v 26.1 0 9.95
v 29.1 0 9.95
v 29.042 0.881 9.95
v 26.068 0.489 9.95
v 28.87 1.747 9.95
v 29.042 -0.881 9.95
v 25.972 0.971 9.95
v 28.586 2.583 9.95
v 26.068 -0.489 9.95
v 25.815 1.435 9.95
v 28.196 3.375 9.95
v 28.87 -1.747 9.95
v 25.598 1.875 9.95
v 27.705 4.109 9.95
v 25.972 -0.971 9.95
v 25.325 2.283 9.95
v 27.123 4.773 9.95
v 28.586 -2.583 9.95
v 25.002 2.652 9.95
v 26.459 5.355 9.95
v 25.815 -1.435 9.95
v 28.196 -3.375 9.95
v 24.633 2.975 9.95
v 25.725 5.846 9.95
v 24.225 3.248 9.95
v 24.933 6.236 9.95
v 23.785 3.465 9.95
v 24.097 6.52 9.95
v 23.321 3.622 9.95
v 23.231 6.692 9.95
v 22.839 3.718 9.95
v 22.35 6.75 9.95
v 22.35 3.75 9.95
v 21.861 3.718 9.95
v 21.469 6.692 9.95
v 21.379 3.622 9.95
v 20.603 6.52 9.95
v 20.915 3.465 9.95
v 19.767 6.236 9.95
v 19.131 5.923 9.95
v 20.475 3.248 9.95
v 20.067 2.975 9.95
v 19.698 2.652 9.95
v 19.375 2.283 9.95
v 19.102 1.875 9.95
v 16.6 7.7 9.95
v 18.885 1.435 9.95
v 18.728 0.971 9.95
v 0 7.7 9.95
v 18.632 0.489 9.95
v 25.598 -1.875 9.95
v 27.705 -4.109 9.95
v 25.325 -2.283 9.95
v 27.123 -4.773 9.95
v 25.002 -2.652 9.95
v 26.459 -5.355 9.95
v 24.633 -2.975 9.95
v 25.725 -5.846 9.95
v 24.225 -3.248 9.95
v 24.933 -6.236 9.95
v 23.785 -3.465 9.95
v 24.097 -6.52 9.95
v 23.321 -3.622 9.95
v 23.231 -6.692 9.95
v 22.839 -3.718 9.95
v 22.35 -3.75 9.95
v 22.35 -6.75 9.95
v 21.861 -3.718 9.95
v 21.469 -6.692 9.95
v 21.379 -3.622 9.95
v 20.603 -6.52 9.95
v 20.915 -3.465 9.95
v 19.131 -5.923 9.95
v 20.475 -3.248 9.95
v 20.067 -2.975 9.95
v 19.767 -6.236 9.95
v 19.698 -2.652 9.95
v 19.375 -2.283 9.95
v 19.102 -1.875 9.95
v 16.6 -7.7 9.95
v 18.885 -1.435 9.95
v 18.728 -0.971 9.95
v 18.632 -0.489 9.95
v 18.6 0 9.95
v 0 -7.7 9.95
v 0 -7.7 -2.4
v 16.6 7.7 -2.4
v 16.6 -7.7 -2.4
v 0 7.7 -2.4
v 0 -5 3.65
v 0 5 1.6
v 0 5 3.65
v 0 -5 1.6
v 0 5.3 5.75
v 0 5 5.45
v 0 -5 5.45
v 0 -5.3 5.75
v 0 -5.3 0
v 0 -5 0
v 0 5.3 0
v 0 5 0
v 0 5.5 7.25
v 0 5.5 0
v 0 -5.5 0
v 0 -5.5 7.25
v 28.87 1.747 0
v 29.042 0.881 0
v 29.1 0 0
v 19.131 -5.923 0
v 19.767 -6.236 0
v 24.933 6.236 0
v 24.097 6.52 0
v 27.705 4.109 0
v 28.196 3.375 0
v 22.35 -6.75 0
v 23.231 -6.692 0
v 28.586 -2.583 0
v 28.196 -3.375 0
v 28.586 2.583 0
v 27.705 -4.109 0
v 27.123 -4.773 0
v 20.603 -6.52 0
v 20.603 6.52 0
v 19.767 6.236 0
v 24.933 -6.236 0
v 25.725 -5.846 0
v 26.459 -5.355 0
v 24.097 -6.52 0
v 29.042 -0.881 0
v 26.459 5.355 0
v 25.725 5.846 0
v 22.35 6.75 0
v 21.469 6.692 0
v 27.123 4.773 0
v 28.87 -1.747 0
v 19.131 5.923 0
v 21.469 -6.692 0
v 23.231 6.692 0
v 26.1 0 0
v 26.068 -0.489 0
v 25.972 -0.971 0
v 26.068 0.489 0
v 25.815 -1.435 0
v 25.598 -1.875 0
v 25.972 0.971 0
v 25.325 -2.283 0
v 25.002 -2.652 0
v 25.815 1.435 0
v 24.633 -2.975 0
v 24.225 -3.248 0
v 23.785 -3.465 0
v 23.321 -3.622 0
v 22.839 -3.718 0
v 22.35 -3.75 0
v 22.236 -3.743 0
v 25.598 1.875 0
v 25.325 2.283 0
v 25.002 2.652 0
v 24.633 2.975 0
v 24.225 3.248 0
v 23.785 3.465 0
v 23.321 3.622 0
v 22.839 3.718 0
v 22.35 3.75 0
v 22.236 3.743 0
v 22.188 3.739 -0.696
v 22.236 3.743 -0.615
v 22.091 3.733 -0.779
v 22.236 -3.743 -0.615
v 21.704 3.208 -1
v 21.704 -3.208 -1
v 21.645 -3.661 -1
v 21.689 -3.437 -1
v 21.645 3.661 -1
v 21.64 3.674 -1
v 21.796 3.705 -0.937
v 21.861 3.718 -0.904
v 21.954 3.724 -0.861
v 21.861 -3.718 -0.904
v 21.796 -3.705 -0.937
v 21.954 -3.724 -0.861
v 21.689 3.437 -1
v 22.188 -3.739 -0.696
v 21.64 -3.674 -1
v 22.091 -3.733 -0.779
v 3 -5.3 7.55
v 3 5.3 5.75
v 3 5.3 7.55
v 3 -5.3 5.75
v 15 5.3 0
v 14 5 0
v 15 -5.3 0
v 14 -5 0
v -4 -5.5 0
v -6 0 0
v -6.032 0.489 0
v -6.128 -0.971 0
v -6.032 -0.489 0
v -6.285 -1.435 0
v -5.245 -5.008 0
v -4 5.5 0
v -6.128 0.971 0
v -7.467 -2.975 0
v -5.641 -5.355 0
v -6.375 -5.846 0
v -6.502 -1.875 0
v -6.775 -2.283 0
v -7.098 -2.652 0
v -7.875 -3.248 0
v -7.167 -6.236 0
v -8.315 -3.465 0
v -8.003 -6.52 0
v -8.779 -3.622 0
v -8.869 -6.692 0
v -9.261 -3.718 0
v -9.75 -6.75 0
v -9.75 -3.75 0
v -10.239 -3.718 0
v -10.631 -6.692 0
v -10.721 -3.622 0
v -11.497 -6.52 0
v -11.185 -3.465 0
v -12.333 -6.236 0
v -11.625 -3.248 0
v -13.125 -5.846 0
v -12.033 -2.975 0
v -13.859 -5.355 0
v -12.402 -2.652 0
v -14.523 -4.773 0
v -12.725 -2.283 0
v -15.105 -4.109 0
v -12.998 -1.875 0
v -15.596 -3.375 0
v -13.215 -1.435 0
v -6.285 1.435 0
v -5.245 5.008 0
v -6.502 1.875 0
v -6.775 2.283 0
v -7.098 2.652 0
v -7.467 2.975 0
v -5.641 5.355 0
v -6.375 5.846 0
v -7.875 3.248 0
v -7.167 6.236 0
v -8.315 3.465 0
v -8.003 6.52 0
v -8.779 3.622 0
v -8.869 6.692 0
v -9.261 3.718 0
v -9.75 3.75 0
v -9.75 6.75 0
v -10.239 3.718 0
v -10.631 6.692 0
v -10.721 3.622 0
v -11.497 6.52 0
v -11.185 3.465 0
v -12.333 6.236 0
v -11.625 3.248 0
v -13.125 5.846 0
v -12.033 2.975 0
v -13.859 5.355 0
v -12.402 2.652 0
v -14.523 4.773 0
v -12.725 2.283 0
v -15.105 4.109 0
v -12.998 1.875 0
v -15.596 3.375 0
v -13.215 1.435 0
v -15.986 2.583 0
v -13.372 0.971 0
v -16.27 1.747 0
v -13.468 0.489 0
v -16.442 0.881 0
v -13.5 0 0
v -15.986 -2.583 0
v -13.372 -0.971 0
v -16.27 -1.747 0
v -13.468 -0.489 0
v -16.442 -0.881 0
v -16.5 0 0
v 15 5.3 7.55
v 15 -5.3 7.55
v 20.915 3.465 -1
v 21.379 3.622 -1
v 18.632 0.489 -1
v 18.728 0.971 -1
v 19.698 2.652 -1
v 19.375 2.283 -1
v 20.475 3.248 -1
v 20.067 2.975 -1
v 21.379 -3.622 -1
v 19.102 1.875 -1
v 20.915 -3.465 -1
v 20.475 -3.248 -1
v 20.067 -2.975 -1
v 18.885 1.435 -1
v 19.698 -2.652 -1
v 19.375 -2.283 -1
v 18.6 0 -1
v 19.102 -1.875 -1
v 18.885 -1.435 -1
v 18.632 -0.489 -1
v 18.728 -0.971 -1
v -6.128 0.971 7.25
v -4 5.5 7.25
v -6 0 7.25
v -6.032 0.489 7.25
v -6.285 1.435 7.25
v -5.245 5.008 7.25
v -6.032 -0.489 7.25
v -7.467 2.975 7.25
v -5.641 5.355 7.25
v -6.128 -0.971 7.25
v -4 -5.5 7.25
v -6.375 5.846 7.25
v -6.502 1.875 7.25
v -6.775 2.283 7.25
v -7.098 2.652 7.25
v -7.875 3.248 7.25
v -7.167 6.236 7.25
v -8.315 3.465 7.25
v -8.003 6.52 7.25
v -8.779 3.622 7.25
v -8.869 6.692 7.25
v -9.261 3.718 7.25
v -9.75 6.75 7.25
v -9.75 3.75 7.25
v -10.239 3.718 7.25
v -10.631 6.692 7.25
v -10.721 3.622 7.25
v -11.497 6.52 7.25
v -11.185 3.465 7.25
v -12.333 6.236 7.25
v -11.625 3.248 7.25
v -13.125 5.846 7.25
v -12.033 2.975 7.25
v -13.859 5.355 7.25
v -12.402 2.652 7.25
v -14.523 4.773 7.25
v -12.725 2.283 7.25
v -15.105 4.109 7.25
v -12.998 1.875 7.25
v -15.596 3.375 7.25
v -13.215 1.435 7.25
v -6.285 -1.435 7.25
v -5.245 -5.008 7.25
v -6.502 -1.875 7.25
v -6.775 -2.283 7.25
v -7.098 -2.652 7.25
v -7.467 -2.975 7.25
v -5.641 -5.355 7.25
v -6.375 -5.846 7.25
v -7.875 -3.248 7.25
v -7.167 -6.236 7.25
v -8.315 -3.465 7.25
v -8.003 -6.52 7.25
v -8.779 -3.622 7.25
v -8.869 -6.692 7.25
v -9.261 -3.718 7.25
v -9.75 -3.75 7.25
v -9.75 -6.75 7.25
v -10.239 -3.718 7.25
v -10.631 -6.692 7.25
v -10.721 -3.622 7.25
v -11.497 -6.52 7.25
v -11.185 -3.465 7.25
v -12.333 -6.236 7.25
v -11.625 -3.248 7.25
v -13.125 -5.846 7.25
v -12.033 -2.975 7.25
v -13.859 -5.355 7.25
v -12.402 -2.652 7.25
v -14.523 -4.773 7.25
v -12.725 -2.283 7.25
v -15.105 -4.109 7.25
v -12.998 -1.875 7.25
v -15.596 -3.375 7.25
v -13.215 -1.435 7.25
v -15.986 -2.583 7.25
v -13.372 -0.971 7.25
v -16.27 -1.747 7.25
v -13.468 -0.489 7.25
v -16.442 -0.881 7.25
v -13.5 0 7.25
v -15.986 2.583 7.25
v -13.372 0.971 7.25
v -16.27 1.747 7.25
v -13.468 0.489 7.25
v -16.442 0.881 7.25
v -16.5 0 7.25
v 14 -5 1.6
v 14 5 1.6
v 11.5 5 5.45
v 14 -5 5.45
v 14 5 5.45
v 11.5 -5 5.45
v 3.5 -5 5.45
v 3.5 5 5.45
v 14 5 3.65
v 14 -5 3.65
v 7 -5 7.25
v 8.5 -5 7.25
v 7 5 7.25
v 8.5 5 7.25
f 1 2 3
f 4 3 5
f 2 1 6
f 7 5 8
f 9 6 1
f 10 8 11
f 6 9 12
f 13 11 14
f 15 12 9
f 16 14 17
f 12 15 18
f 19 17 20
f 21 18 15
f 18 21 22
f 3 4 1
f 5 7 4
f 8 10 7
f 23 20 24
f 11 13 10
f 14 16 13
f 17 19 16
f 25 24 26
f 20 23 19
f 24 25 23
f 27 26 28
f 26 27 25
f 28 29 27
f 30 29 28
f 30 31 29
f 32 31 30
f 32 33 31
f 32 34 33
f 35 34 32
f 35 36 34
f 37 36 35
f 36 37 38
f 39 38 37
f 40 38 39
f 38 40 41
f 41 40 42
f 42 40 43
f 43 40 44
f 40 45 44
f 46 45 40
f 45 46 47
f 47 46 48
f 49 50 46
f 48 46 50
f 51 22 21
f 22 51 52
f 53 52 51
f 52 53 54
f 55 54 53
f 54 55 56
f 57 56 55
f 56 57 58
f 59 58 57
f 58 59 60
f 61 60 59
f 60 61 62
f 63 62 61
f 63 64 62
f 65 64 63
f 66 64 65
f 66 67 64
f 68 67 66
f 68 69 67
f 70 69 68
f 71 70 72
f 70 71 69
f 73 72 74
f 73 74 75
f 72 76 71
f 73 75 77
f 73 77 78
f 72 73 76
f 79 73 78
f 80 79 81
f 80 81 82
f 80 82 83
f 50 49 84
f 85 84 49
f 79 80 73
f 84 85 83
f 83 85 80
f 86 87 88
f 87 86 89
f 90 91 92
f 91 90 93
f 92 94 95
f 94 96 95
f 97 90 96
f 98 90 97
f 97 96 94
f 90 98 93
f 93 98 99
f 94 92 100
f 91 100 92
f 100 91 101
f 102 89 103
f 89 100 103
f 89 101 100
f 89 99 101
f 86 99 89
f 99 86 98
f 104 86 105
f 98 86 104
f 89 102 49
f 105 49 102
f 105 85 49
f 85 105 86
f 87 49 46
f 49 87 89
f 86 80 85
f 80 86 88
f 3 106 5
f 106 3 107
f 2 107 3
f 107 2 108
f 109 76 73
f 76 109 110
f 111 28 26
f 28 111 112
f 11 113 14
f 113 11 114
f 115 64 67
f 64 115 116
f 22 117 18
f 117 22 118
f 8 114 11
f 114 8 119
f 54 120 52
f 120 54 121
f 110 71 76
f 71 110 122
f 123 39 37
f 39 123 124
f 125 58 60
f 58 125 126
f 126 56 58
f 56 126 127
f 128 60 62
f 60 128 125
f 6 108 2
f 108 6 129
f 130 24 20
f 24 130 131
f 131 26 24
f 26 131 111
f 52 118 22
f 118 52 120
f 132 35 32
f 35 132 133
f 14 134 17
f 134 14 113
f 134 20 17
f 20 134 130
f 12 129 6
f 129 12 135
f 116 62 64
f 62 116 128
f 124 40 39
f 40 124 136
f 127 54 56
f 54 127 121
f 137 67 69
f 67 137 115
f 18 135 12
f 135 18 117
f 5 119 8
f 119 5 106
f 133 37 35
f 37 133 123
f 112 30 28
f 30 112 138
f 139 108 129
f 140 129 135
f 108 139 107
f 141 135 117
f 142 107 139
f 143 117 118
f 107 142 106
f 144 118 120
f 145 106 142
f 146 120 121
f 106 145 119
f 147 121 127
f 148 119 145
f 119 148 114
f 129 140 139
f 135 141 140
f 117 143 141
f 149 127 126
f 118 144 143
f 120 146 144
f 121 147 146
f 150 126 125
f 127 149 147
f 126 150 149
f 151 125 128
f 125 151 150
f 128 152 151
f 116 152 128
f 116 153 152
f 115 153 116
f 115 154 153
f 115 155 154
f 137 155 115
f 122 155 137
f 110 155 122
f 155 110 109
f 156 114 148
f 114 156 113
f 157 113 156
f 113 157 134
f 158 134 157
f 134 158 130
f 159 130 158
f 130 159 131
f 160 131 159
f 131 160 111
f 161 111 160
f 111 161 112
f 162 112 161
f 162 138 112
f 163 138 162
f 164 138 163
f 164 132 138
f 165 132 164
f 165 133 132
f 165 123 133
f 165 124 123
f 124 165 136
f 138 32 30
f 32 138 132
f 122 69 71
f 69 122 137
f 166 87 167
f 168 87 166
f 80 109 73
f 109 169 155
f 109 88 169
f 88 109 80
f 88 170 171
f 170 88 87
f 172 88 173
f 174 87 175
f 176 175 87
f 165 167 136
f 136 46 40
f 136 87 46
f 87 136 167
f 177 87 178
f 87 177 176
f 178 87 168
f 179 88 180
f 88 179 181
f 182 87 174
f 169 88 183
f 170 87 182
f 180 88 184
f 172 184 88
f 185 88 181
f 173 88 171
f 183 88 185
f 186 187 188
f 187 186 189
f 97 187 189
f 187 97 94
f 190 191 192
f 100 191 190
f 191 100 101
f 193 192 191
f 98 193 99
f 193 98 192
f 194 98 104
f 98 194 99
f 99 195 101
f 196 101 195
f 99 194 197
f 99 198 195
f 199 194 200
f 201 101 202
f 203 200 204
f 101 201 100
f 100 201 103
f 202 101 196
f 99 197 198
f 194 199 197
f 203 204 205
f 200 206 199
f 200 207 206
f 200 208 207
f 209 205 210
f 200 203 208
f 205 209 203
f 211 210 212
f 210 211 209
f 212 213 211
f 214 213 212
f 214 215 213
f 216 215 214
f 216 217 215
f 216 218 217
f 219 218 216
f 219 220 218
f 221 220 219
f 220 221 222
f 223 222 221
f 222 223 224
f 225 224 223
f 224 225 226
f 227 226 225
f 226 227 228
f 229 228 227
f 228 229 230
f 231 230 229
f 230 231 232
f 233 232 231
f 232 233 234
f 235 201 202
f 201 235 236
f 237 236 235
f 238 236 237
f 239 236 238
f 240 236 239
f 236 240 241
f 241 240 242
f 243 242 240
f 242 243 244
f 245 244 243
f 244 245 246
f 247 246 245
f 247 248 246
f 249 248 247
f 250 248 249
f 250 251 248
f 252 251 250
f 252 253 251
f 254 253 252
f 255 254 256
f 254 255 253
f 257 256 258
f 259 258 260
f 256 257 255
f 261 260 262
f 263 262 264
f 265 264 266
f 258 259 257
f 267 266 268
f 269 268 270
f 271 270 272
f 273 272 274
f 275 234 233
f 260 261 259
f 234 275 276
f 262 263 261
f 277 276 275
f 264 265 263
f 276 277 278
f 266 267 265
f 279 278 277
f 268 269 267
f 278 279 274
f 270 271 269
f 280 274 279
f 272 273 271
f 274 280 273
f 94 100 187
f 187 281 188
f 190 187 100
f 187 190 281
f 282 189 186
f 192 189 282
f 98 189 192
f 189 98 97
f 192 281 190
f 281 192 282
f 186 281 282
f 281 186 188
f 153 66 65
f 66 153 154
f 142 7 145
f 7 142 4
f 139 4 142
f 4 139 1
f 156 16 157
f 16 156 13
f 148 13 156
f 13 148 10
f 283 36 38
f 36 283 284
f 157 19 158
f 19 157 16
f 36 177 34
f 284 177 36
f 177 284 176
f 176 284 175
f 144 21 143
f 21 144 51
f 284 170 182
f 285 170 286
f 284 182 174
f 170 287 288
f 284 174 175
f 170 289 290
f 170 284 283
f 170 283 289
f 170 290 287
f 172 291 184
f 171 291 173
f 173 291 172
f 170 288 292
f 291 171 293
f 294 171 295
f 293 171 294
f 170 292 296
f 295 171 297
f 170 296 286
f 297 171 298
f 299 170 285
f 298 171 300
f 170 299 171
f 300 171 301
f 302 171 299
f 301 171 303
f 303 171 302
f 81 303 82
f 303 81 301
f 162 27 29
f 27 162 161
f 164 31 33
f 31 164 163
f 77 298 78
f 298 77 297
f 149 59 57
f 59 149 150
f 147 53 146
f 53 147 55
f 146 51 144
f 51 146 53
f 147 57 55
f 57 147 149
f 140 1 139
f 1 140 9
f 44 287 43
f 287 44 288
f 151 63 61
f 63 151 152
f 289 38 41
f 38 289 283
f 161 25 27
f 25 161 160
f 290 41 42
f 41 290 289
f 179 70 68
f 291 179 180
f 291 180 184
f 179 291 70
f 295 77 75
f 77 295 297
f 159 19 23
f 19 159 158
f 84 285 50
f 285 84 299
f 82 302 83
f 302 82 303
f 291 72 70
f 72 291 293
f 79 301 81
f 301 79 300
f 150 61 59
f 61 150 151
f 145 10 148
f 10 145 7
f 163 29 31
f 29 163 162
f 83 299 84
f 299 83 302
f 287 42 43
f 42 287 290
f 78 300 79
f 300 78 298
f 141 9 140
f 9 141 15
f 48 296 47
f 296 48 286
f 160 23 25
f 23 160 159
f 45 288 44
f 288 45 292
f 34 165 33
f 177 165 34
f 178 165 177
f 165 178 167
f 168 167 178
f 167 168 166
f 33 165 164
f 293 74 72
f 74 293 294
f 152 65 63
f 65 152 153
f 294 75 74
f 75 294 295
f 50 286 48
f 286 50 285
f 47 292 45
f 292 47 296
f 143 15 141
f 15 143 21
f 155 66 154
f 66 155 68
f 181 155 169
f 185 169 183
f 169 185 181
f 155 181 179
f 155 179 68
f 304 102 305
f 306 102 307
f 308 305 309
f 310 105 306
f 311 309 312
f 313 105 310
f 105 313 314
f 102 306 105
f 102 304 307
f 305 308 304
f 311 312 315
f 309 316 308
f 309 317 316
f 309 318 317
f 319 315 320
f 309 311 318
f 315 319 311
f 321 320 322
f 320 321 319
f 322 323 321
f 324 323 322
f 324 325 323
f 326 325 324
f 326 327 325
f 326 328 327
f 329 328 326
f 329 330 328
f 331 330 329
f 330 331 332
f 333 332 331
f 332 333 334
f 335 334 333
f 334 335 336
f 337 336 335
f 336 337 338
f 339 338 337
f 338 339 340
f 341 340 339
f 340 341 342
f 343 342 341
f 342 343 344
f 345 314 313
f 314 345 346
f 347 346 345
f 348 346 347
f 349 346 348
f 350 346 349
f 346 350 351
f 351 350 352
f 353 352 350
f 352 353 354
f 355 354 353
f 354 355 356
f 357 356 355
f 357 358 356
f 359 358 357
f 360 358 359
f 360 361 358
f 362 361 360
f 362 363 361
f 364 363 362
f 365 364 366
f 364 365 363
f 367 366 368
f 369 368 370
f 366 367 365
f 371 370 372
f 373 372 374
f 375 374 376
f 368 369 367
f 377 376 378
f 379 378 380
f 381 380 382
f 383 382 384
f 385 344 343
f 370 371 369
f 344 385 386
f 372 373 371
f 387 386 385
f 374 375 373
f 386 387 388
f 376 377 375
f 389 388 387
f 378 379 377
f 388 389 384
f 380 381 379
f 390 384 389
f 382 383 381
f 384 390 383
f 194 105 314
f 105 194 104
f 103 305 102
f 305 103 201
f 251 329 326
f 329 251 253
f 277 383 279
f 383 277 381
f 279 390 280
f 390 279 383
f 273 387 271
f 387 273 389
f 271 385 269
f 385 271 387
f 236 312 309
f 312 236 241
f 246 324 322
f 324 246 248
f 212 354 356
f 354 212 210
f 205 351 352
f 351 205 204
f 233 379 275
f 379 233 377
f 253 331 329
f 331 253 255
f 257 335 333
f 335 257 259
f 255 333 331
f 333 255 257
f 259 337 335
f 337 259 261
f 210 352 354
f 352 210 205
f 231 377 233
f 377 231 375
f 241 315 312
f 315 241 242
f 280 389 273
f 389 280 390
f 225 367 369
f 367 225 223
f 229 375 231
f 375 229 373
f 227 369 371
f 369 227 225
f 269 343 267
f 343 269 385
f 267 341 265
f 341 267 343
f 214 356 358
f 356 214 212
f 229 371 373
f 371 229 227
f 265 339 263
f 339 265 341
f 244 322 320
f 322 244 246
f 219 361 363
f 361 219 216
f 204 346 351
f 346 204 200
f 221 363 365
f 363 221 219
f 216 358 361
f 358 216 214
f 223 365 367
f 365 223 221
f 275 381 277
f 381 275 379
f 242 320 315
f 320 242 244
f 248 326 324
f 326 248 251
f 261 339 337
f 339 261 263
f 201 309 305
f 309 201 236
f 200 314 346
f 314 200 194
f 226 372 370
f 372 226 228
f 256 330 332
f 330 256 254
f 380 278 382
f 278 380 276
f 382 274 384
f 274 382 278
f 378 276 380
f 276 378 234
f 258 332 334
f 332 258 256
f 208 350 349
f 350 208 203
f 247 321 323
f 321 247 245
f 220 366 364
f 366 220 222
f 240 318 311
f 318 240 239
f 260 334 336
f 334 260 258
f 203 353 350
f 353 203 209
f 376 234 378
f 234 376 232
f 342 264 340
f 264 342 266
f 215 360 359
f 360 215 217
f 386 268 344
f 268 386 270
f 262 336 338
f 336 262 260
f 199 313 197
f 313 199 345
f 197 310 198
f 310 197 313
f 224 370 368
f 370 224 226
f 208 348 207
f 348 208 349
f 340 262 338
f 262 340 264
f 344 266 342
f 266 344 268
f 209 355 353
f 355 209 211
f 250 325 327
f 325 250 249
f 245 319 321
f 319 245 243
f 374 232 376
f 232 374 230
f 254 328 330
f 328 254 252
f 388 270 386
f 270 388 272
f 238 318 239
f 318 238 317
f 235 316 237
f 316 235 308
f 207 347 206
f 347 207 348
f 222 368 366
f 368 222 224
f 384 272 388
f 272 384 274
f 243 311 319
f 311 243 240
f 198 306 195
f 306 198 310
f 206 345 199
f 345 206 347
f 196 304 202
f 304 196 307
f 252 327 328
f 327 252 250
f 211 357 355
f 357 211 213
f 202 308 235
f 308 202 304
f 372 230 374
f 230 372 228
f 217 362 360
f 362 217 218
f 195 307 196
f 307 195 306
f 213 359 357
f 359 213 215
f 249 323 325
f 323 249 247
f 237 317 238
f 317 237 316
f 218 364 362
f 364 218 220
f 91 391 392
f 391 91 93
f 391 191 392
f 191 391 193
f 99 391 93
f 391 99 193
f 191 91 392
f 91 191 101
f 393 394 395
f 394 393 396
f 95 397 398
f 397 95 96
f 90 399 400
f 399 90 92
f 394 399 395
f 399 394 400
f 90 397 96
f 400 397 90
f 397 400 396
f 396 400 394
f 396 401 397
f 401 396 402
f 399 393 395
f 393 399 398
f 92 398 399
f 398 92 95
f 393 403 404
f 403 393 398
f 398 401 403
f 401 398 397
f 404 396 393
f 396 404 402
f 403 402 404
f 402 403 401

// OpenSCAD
// =====================================================================
// Breakaway Key Ring Clasp v2
// A proper cantilever snap-fit: a flexing beam with a ramped barb on
// the male half hooks into a stepped pocket in the female half.
// =====================================================================

// ---------- TUNABLE PARAMETERS ----------
wall          = 2.4;   // housing side/roof wall thickness
plug_w        = 10;    // width (Y) of the plug / cavity
w_clear       = 0.6;   // total width clearance (cavity_w = plug_w + w_clear)

base_h        = 1.6;   // base rail thickness (always contacts socket floor)
arm_t         = 1.8;   // beam thickness -- PRIMARY stiffness lever
L_free        = 14;    // free (flexing) length of the beam, tip to root
root_len      = 4;     // length of the solid flange that stops against the mouth
tip_lead      = 2.5;   // blunt lead-in before the ramp starts

barb_h        = 1.8;   // bump height -- THE interlock depth lever. Push this as
                        // deep as you want; flex_gap below is derived from it
                        // automatically so the air gap is always just barely
                        // enough to swallow it, never more.
insertion_clearance = 0.25;
                        // minimum extra room, beyond barb_h itself, that the
                        // beam needs to fully compress and let the barb pass.
                        // This is a print-tolerance/friction margin, not a
                        // style choice - too small and the tab jams or shears
                        // on insertion/removal instead of flexing. 0.15-0.3mm
                        // is reasonable for FDM; tighten toward 0.15 only if
                        // your printer holds tolerance well.
flex_gap = barb_h + insertion_clearance;
                        // DERIVED, not hand-set: this is exactly what makes
                        // barb_h "as deep as possible while leaving just
                        // enough air gap" - raising barb_h automatically
                        // raises flex_gap by the same amount, so there's
                        // never slack wasted and never a gap that's too
                        // tight to release.

ramp_in_len   = 3.0;   // front (insertion) ramp
barb_flat     = 1.5;   // flat top of the bump, sits in the pocket when locked
release_ramp_len = 3.5; // back ramp -- PRIMARY pull-apart force lever

// ---------- DESIGN-RULE ASSERTIONS ----------
// These guard the one invariant that actually makes this a functional
// part rather than a fused blob or a loose rattle: the beam must have
// *just enough* clearance to fully retract the barb, and no more.
assert(insertion_clearance > 0,
    "insertion_clearance must be > 0mm - with zero (or negative) clearance the beam has nowhere to compress into, so the barb cannot retract and the part can never be inserted or removed.");
assert(flex_gap >= barb_h + insertion_clearance - 1e-9,
    str("flex_gap (", flex_gap, "mm) is not large enough for barb_h (", barb_h,
        "mm) plus insertion_clearance (", insertion_clearance,
        "mm) - the barb would physically collide with the throat ceiling on insertion. If you hand-set flex_gap instead of using the derived value, increase it."));
assert(barb_h > 0, "barb_h must be positive - it's the whole interlock; at 0 there is nothing to hold the two halves together.");
assert(arm_t >= 1.0,
    str("arm_t (", arm_t, "mm) is too thin to print reliably as a repeatedly-flexed beam - use at least 1.0mm."));

c1            = 0.3;   // fit clearance added to throat/pocket ceiling heights
tip_gap       = 1.0;   // clearance between tip and the socket's back wall
back_wall     = 1.6;   // thickness of the socket's closed back wall
step_margin   = 0.5;   // margin so the bump fully clears the step when seated

loop_id       = 7.5;
loop_wall     = 3;

$fn = 48;

// ---------- DERIVED ----------
barb_start   = tip_lead;
ramp_in_end  = barb_start + ramp_in_len;
flat_end     = ramp_in_end + barb_flat;
barb_end     = flat_end + release_ramp_len;
L_total      = L_free + root_len;

H_low  = base_h + flex_gap + arm_t + c1;
H_high = H_low + barb_h;

w_bump_shallow_seated = L_free - barb_end;
step_pos = max(0.1, w_bump_shallow_seated - step_margin);

socket_len = L_free + tip_gap;
outer_len  = socket_len + back_wall;

cavity_w = plug_w + w_clear;
outer_w  = cavity_w + 2*wall;
outer_h  = H_high + wall;

echo("barb_h=", barb_h, "flex_gap=", flex_gap, "(slack over minimum =",
     flex_gap - barb_h - insertion_clearance, "mm)");
echo("H_low=", H_low, "H_high=", H_high, "step_pos=", step_pos,
     "socket_len=", socket_len, "bump seated span=",
     w_bump_shallow_seated, "-", L_free-barb_start);

module keyring_loop_solid(h) {
    // solid boss only -- no hole. The hole is cut once, at the very end,
    // over the whole assembled region (see male_root_and_loop /
    // female_half below) so no connector geometry can ever intrude into
    // it again, regardless of how the blend/fillet is shaped.
    cylinder(h = h, r = loop_id/2 + loop_wall);
}

module male_base_rail() {
    translate([0,-plug_w/2,0])
        cube([L_total, plug_w, base_h]);
}

module male_beam() {
    // free cantilever beam, flat top (no barb), full length 0..L_free
    translate([0, -plug_w/2, base_h+flex_gap])
        cube([L_free, plug_w, arm_t]);
}

module male_barb() {
    // ramp / flat / ramp bump sitting on top of the beam, extruded across plug_w (Y)
    // polygon+extrude builds in local Z=0..plug_w; rotate(90,x) maps that to Y=-plug_w..0;
    // translate by +plug_w/2 recenters it to Y=-plug_w/2..+plug_w/2, matching the beam.
    translate([0, plug_w/2, 0])
    rotate([90,0,0])
    linear_extrude(height = plug_w)
    polygon(points = [
        [barb_start,  base_h+flex_gap+arm_t],
        [ramp_in_end, base_h+flex_gap+arm_t+barb_h],
        [flat_end,    base_h+flex_gap+arm_t+barb_h],
        [barb_end,    base_h+flex_gap+arm_t],
    ]);
}

module male_root_and_loop() {
    full_h = base_h+flex_gap+arm_t+barb_h;
    loop_cx = L_total + loop_id/2 + loop_wall - 1;
    difference() {
        union() {
            // root block: anchors the beam, acts as the insertion-depth stop
            translate([L_free, -plug_w/2 - 0.5, 0])
                cube([root_len, plug_w+1, full_h]);
            // key ring loop boss + a generous blended connector -- both
            // are allowed to overlap the hole area here, because the
            // hole itself is cut afterward, once, below.
            translate([loop_cx, 0, 0])
                keyring_loop_solid(full_h);
            hull() {
                translate([L_total-1, -plug_w/2-0.5, 0])
                    cube([1, plug_w+1, full_h]);
                translate([loop_cx, 0, 0])
                    cylinder(h = full_h, r = loop_wall);
            }
        }
        // the key ring hole: cut once, full diameter, guaranteed clear
        translate([loop_cx, 0, -1])
            cylinder(h = full_h+2, r = loop_id/2);
    }
}

module male_half() {
    union() {
        male_base_rail();
        male_beam();
        male_barb();
        male_root_and_loop();
    }
}

module female_half() {
    loop_cx = outer_len + loop_id/2 + loop_wall - 1;
    difference() {
        union() {
            translate([0, -outer_w/2, -wall])
                cube([outer_len, outer_w, outer_h+wall]);
            translate([loop_cx, 0, 0])
                keyring_loop_solid(outer_h);
            hull() {
                translate([outer_len-1, -outer_w/2, -wall])
                    cube([1, outer_w, outer_h+wall]);
                translate([loop_cx, 0, 0])
                    cylinder(h = outer_h, r = loop_wall);
            }
        }
        translate([-1, -cavity_w/2, 0])
            cube([step_pos+1, cavity_w, H_low]);
        translate([step_pos, -cavity_w/2, 0])
            cube([socket_len-step_pos, cavity_w, H_high]);
        // the key ring hole: cut once, full diameter, guaranteed clear
        translate([loop_cx, 0, -1])
            cylinder(h = outer_h+2, r = loop_id/2);
    }
}

// fully seated / locked assembly: male local x=t -> world x = L_free - t
module assembly_seated() {
    color("SteelBlue") female_half();
    color([1,0.5,0.4])
    translate([L_free, 0, 0]) rotate([0,0,180]) male_half();
}

assembly_seated();
